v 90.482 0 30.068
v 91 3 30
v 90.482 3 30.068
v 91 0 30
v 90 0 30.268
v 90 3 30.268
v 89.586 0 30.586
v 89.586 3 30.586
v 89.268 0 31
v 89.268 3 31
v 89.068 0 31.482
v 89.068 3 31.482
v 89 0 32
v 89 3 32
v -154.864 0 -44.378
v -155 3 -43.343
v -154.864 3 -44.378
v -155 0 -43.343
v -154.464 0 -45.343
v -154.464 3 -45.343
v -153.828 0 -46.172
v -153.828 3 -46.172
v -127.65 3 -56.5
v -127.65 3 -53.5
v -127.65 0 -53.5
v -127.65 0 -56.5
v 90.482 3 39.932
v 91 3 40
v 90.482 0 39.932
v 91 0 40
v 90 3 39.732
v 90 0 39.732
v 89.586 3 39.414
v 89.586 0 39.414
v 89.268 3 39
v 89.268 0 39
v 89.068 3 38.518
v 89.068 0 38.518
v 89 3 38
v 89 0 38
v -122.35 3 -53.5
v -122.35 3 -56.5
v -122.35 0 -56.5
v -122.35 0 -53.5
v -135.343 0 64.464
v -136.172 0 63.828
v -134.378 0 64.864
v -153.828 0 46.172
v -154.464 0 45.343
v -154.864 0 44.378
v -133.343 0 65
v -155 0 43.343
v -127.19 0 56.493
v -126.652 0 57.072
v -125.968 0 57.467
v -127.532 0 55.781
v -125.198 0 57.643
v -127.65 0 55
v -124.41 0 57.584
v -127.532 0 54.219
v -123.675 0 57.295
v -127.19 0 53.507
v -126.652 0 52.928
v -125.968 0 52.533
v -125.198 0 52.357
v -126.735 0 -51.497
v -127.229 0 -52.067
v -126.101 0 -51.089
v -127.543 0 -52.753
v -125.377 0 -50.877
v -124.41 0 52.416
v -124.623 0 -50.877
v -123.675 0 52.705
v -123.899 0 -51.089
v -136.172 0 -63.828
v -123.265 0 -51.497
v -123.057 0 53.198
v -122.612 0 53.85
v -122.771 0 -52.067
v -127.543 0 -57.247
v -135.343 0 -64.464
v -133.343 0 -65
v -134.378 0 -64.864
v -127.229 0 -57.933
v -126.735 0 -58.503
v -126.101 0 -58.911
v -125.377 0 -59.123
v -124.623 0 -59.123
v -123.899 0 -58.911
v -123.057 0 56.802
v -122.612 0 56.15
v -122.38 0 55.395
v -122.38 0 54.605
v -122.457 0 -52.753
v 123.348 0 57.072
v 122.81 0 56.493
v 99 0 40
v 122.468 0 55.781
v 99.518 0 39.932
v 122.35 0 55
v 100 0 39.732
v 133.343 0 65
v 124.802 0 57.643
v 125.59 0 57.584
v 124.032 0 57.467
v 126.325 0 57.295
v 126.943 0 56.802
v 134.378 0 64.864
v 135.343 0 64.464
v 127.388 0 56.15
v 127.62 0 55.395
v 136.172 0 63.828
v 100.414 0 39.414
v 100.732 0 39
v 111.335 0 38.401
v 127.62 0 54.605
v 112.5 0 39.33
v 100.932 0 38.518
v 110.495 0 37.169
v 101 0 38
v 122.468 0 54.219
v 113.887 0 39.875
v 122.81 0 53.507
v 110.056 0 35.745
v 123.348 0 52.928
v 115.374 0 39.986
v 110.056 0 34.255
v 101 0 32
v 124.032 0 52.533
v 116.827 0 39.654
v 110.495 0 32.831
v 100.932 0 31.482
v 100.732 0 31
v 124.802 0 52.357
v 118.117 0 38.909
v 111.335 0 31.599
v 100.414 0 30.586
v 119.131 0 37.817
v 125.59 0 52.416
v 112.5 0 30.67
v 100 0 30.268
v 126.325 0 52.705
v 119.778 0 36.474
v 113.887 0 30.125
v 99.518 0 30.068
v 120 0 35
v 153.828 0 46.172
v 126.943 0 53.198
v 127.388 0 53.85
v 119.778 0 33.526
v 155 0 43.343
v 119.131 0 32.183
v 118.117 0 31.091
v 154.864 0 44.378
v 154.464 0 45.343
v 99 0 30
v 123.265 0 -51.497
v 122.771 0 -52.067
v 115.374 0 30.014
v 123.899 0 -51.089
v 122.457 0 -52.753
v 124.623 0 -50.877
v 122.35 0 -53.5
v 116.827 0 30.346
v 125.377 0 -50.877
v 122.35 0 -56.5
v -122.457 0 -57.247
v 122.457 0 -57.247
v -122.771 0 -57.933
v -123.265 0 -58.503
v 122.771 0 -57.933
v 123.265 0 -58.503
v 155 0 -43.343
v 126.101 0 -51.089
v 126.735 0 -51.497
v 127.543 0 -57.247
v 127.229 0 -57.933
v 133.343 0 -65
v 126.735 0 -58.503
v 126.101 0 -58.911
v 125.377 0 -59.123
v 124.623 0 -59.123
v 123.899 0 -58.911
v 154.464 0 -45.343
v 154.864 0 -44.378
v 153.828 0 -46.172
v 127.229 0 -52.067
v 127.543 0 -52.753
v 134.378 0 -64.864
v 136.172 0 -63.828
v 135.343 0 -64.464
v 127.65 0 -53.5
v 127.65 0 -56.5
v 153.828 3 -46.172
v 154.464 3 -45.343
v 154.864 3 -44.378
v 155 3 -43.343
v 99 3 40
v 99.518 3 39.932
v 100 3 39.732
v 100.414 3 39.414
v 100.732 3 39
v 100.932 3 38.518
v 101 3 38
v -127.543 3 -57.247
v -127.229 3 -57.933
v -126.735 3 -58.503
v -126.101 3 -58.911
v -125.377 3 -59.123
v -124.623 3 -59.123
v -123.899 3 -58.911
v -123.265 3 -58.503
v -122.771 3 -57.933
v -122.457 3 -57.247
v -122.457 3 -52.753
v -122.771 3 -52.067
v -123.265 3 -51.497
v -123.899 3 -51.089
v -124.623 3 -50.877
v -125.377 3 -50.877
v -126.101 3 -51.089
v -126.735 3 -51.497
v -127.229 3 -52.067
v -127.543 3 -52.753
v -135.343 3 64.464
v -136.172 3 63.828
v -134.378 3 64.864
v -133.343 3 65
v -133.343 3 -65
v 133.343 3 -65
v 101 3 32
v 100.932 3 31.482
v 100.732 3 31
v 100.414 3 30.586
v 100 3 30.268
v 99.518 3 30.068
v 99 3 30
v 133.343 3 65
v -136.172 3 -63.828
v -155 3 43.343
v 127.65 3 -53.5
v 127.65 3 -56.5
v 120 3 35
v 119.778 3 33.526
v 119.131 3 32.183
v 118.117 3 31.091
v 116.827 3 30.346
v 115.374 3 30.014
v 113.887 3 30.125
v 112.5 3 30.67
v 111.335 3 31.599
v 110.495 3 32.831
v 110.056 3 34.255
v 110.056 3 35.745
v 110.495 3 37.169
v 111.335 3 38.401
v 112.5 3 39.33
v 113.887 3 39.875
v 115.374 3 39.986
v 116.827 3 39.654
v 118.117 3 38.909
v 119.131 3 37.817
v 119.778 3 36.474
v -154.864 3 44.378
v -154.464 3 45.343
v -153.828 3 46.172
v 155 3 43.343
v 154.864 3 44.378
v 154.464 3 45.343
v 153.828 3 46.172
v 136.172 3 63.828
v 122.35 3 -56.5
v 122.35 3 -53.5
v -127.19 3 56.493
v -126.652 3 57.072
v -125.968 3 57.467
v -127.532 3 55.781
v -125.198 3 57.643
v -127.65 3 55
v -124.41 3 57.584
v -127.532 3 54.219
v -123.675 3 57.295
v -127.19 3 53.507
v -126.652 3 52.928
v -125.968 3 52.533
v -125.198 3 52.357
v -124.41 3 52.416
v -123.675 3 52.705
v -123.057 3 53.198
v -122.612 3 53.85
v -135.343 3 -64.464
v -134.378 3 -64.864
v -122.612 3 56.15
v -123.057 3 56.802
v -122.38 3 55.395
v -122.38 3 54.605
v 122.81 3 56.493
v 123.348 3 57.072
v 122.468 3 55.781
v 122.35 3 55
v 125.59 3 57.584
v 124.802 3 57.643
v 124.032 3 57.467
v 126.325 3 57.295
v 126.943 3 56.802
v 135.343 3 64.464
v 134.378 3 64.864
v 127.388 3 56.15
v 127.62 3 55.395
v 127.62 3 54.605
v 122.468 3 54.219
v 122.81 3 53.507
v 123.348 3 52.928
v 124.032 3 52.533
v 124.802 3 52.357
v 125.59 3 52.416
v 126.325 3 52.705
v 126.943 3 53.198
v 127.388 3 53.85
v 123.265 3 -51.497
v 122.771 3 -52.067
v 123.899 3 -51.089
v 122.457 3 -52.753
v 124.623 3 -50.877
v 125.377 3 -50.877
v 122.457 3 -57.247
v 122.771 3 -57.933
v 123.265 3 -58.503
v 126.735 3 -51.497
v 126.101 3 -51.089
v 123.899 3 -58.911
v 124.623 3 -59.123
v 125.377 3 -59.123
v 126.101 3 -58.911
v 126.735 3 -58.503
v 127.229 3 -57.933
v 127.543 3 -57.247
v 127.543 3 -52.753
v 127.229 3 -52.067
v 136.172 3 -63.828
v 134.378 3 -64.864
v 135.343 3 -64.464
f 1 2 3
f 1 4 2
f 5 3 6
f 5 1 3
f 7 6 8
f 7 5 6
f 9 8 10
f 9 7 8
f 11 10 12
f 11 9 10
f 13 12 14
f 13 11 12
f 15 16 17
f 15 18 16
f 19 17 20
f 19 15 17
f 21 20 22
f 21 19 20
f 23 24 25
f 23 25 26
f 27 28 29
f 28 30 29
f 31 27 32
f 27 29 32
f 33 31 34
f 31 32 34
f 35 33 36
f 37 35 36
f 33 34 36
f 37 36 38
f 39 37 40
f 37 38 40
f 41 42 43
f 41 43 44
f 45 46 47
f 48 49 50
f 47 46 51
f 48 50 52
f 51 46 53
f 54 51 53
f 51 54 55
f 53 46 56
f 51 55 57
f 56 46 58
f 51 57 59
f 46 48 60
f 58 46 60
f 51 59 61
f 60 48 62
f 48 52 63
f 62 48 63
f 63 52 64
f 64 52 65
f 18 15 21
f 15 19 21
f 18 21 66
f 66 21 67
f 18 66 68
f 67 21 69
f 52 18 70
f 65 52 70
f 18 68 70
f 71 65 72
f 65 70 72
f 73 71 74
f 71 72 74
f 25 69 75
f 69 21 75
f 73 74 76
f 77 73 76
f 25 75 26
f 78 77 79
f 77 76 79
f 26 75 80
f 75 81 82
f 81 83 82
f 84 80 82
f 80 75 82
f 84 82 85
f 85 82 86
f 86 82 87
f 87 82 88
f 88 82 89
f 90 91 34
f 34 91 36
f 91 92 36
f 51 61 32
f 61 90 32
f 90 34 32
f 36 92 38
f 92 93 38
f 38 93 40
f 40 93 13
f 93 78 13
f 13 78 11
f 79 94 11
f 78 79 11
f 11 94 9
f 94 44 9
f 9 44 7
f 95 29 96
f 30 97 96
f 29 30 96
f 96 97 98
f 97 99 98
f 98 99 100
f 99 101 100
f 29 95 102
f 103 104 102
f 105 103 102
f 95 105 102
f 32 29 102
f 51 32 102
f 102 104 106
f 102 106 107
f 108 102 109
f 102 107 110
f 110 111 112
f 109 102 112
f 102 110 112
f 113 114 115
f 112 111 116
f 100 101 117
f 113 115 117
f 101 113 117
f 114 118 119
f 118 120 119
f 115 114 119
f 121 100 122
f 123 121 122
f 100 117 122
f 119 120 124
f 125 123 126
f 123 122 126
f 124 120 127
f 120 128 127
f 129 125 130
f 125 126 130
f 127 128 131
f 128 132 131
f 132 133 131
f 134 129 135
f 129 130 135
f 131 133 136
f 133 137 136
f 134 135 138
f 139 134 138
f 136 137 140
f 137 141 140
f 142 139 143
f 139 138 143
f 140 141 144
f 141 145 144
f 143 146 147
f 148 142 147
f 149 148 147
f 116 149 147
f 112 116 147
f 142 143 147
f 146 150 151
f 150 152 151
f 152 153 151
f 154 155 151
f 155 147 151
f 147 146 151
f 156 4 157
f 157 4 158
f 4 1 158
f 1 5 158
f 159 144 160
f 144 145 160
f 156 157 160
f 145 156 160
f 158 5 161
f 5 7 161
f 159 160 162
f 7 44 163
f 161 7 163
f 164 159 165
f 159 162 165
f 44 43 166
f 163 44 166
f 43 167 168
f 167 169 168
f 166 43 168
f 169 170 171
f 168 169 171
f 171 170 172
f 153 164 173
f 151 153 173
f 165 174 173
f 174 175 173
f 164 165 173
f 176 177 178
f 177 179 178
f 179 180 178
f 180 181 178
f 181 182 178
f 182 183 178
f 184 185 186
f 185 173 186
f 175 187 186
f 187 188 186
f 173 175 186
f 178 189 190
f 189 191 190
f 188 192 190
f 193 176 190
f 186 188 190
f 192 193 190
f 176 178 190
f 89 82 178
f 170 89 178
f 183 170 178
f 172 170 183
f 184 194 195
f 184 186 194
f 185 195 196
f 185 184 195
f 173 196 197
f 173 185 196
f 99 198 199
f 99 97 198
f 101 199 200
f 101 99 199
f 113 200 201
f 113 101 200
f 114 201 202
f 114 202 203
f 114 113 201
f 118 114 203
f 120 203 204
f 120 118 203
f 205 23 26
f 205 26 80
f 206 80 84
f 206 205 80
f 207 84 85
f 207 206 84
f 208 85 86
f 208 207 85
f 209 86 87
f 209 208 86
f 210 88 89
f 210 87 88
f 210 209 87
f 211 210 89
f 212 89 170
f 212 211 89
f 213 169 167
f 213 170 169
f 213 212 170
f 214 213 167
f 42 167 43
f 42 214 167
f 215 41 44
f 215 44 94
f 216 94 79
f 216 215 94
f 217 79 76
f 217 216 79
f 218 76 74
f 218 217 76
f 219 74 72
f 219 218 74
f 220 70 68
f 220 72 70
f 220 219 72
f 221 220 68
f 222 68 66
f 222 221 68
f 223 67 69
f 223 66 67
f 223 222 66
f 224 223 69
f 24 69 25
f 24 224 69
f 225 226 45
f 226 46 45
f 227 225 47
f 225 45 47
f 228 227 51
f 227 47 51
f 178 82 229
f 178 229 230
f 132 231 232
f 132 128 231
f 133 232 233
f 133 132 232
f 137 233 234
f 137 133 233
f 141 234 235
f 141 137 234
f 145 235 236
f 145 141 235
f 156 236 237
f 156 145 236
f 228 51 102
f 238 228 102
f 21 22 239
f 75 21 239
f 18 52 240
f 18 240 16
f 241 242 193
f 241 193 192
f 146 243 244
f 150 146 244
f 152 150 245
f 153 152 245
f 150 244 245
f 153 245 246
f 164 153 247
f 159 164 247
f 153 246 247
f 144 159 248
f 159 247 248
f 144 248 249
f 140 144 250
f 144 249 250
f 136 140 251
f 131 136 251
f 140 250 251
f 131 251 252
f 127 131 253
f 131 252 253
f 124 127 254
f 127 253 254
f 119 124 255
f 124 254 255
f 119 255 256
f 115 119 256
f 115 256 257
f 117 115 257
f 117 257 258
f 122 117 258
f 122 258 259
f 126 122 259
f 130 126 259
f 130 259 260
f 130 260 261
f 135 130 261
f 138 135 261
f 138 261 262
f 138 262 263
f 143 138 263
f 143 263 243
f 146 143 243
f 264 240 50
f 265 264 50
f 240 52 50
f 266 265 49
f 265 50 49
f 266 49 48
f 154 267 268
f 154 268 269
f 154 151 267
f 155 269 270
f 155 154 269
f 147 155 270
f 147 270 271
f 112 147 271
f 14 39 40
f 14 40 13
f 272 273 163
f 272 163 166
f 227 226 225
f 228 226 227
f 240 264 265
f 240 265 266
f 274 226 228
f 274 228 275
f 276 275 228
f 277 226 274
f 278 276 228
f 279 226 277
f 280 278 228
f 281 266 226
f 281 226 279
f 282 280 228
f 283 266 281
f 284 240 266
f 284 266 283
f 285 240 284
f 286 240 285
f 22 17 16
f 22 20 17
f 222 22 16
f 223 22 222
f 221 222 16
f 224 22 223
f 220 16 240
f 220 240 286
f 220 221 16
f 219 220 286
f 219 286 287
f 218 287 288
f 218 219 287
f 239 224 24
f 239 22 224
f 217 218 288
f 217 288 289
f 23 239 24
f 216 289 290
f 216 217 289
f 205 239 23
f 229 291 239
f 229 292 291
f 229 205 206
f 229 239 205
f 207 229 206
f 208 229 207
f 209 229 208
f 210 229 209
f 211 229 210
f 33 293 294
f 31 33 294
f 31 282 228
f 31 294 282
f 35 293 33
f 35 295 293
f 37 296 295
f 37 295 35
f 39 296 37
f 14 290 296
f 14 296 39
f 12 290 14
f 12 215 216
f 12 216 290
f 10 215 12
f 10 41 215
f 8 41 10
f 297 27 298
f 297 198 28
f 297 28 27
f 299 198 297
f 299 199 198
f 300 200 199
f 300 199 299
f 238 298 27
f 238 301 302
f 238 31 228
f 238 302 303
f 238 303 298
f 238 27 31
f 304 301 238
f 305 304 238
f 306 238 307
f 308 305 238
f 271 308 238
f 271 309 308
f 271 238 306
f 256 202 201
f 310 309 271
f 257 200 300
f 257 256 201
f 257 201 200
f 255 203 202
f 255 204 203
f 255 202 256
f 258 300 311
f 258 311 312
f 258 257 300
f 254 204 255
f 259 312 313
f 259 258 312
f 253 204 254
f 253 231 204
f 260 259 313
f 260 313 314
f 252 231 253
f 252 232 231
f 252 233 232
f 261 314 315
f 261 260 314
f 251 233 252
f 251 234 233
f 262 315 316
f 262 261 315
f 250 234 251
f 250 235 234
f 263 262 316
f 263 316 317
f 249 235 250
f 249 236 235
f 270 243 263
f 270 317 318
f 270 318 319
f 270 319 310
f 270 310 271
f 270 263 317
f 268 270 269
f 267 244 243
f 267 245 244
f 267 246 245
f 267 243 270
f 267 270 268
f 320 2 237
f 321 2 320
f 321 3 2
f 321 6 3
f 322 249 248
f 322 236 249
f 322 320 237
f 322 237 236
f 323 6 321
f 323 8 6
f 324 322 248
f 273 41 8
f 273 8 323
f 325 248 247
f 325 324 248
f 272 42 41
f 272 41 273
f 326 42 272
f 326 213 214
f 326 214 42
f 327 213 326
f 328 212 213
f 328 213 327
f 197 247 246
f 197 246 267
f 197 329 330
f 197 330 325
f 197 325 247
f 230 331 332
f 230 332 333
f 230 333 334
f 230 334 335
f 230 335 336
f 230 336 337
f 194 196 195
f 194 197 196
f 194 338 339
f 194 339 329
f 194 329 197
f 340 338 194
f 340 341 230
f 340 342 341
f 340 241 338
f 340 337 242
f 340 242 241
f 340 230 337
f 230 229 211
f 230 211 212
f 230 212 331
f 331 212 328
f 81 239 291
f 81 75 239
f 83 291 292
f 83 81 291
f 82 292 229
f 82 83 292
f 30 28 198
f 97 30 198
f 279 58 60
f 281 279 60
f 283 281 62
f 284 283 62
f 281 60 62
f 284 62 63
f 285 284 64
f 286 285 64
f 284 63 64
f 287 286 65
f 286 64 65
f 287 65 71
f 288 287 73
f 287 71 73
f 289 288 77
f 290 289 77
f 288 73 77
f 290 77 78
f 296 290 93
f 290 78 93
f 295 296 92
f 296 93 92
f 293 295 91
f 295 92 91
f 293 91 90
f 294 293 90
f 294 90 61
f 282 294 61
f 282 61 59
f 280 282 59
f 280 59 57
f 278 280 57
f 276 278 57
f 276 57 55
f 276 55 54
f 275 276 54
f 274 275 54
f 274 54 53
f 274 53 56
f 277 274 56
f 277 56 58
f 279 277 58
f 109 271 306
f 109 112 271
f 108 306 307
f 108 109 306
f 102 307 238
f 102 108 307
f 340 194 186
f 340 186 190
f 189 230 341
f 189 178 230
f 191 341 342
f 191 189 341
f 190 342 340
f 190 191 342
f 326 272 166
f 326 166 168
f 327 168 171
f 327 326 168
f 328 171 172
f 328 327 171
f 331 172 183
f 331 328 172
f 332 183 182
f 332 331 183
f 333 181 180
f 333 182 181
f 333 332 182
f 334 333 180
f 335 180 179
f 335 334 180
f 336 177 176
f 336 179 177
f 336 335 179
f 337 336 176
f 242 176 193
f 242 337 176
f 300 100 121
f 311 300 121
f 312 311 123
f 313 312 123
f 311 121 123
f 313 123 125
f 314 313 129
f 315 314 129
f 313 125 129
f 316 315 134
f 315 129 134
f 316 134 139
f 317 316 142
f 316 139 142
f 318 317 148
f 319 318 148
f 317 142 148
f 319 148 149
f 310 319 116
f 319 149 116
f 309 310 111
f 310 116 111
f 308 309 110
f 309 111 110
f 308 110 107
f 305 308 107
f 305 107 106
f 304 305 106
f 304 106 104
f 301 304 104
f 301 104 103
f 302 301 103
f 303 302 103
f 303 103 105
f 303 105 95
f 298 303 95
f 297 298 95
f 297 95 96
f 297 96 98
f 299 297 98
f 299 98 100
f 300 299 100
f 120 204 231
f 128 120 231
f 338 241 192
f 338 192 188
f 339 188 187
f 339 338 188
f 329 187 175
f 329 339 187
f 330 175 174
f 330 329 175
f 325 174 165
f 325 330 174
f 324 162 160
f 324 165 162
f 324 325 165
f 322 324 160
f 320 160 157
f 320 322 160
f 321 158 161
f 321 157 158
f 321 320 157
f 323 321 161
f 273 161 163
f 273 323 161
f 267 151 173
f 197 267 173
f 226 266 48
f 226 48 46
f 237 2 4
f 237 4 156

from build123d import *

# Parameters (mm, degrees)
SKETCH1_W                  = 310
SKETCH1_H                  = 130
BOSS_EXTRUDE1_DEPTH        = 3
CUT_EXTRUDE2_DEPTH         = 4
FILLET1_R                  = 4
F_5_3_5_3_DIAMETER_HOLE1_D = 5.3
SKETCH6_R                  = 5
SKETCH6_W                  = 12
SKETCH6_H                  = 10
CUT_EXTRUDE1_DEPTH         = 4
FILLET2_R                  = 2
CUT_EXTRUDE3_DEPTH         = 4


with BuildPart() as part:
    # Sketch1 → Boss-Extrude1 (new body)
    with BuildSketch(Plane(origin=(0, 0, 0), x_dir=(1, 0, 0), z_dir=(0, 1, 0))):
        Rectangle(SKETCH1_W, SKETCH1_H)
    extrude(amount=BOSS_EXTRUDE1_DEPTH)

    # Sketch7 → Cut-Extrude2 (cut, through all)
    with BuildSketch(Plane(origin=(0, 3, 0), x_dir=(1, 0, 0), z_dir=(0, 1, 0))):
        Polygon((-155, 65), (-155, 45), (-135, 65), align=None)
        Polygon((135, 65), (155, 65), (155, 45), align=None)
        Polygon((155, -65), (155, -45), (135, -65), align=None)
        Polygon((-135, -65), (-155, -65), (-155, -45), align=None)
    extrude(amount=-CUT_EXTRUDE2_DEPTH, mode=Mode.SUBTRACT)

    # Fillet1
    fillet1_edges = [part.edges().sort_by_distance(p)[0] for p in [
        (-155, 1.5, 45),
        (-135, 1.5, 65),
        (135, 1.5, 65),
        (155, 1.5, 45),
        (155, 1.5, -45),
        (135, 1.5, -65),
        (-135, 1.5, -65),
        (-155, 1.5, -45),
    ]]
    fillet(fillet1_edges, radius=FILLET1_R)

    # Ø5.3 (5.3) Diameter Hole1 (through all)
    with Locations(Plane(origin=(0, 3, 0), x_dir=(1, 0, 0), z_dir=(0, 1, 0))):
        with Locations((125, 55), (-125, -55), (-125, 55), (125, -55)):
            Hole(F_5_3_5_3_DIAMETER_HOLE1_D / 2)

    # Sketch6 → Cut-Extrude1 (cut, through all)
    with BuildSketch(Plane(origin=(0, 3, 0), x_dir=(1, 0, 0), z_dir=(0, 1, 0))):
        with Locations((115, -35)):
            Circle(SKETCH6_R)
        with Locations((95, -35)):
            Rectangle(SKETCH6_W, SKETCH6_H)
    extrude(amount=-CUT_EXTRUDE1_DEPTH, mode=Mode.SUBTRACT)

    # Fillet2
    fillet2_edges = [part.edges().sort_by_distance(p)[0] for p in [
        (101, 1.5, 30),
        (101, 1.5, 40),
        (89, 1.5, 40),
        (89, 1.5, 30),
    ]]
    fillet(fillet2_edges, radius=FILLET2_R)

    # Sketch8 → Cut-Extrude3 (cut, through all)
    with BuildSketch(Plane(origin=(0, 3, 0), x_dir=(1, 0, 0), z_dir=(0, 1, 0))):
        with BuildLine():
            Line((-127.65, 53.5), (-127.65, 56.5))
            ThreePointArc((-127.65, 56.5), (-125, 59.15), (-122.35, 56.5))
            Line((-122.35, 56.5), (-122.35, 53.5))
            ThreePointArc((-122.35, 53.5), (-125, 50.85), (-127.65, 53.5))
        make_face()
        with BuildLine():
            Line((122.35, 53.5), (122.35, 56.5))
            ThreePointArc((122.35, 56.5), (125, 59.15), (127.65, 56.5))
            Line((127.65, 56.5), (127.65, 53.5))
            ThreePointArc((127.65, 53.5), (125, 50.85), (122.35, 53.5))
        make_face()
    extrude(amount=-CUT_EXTRUDE3_DEPTH, mode=Mode.SUBTRACT)


solid = part.part
